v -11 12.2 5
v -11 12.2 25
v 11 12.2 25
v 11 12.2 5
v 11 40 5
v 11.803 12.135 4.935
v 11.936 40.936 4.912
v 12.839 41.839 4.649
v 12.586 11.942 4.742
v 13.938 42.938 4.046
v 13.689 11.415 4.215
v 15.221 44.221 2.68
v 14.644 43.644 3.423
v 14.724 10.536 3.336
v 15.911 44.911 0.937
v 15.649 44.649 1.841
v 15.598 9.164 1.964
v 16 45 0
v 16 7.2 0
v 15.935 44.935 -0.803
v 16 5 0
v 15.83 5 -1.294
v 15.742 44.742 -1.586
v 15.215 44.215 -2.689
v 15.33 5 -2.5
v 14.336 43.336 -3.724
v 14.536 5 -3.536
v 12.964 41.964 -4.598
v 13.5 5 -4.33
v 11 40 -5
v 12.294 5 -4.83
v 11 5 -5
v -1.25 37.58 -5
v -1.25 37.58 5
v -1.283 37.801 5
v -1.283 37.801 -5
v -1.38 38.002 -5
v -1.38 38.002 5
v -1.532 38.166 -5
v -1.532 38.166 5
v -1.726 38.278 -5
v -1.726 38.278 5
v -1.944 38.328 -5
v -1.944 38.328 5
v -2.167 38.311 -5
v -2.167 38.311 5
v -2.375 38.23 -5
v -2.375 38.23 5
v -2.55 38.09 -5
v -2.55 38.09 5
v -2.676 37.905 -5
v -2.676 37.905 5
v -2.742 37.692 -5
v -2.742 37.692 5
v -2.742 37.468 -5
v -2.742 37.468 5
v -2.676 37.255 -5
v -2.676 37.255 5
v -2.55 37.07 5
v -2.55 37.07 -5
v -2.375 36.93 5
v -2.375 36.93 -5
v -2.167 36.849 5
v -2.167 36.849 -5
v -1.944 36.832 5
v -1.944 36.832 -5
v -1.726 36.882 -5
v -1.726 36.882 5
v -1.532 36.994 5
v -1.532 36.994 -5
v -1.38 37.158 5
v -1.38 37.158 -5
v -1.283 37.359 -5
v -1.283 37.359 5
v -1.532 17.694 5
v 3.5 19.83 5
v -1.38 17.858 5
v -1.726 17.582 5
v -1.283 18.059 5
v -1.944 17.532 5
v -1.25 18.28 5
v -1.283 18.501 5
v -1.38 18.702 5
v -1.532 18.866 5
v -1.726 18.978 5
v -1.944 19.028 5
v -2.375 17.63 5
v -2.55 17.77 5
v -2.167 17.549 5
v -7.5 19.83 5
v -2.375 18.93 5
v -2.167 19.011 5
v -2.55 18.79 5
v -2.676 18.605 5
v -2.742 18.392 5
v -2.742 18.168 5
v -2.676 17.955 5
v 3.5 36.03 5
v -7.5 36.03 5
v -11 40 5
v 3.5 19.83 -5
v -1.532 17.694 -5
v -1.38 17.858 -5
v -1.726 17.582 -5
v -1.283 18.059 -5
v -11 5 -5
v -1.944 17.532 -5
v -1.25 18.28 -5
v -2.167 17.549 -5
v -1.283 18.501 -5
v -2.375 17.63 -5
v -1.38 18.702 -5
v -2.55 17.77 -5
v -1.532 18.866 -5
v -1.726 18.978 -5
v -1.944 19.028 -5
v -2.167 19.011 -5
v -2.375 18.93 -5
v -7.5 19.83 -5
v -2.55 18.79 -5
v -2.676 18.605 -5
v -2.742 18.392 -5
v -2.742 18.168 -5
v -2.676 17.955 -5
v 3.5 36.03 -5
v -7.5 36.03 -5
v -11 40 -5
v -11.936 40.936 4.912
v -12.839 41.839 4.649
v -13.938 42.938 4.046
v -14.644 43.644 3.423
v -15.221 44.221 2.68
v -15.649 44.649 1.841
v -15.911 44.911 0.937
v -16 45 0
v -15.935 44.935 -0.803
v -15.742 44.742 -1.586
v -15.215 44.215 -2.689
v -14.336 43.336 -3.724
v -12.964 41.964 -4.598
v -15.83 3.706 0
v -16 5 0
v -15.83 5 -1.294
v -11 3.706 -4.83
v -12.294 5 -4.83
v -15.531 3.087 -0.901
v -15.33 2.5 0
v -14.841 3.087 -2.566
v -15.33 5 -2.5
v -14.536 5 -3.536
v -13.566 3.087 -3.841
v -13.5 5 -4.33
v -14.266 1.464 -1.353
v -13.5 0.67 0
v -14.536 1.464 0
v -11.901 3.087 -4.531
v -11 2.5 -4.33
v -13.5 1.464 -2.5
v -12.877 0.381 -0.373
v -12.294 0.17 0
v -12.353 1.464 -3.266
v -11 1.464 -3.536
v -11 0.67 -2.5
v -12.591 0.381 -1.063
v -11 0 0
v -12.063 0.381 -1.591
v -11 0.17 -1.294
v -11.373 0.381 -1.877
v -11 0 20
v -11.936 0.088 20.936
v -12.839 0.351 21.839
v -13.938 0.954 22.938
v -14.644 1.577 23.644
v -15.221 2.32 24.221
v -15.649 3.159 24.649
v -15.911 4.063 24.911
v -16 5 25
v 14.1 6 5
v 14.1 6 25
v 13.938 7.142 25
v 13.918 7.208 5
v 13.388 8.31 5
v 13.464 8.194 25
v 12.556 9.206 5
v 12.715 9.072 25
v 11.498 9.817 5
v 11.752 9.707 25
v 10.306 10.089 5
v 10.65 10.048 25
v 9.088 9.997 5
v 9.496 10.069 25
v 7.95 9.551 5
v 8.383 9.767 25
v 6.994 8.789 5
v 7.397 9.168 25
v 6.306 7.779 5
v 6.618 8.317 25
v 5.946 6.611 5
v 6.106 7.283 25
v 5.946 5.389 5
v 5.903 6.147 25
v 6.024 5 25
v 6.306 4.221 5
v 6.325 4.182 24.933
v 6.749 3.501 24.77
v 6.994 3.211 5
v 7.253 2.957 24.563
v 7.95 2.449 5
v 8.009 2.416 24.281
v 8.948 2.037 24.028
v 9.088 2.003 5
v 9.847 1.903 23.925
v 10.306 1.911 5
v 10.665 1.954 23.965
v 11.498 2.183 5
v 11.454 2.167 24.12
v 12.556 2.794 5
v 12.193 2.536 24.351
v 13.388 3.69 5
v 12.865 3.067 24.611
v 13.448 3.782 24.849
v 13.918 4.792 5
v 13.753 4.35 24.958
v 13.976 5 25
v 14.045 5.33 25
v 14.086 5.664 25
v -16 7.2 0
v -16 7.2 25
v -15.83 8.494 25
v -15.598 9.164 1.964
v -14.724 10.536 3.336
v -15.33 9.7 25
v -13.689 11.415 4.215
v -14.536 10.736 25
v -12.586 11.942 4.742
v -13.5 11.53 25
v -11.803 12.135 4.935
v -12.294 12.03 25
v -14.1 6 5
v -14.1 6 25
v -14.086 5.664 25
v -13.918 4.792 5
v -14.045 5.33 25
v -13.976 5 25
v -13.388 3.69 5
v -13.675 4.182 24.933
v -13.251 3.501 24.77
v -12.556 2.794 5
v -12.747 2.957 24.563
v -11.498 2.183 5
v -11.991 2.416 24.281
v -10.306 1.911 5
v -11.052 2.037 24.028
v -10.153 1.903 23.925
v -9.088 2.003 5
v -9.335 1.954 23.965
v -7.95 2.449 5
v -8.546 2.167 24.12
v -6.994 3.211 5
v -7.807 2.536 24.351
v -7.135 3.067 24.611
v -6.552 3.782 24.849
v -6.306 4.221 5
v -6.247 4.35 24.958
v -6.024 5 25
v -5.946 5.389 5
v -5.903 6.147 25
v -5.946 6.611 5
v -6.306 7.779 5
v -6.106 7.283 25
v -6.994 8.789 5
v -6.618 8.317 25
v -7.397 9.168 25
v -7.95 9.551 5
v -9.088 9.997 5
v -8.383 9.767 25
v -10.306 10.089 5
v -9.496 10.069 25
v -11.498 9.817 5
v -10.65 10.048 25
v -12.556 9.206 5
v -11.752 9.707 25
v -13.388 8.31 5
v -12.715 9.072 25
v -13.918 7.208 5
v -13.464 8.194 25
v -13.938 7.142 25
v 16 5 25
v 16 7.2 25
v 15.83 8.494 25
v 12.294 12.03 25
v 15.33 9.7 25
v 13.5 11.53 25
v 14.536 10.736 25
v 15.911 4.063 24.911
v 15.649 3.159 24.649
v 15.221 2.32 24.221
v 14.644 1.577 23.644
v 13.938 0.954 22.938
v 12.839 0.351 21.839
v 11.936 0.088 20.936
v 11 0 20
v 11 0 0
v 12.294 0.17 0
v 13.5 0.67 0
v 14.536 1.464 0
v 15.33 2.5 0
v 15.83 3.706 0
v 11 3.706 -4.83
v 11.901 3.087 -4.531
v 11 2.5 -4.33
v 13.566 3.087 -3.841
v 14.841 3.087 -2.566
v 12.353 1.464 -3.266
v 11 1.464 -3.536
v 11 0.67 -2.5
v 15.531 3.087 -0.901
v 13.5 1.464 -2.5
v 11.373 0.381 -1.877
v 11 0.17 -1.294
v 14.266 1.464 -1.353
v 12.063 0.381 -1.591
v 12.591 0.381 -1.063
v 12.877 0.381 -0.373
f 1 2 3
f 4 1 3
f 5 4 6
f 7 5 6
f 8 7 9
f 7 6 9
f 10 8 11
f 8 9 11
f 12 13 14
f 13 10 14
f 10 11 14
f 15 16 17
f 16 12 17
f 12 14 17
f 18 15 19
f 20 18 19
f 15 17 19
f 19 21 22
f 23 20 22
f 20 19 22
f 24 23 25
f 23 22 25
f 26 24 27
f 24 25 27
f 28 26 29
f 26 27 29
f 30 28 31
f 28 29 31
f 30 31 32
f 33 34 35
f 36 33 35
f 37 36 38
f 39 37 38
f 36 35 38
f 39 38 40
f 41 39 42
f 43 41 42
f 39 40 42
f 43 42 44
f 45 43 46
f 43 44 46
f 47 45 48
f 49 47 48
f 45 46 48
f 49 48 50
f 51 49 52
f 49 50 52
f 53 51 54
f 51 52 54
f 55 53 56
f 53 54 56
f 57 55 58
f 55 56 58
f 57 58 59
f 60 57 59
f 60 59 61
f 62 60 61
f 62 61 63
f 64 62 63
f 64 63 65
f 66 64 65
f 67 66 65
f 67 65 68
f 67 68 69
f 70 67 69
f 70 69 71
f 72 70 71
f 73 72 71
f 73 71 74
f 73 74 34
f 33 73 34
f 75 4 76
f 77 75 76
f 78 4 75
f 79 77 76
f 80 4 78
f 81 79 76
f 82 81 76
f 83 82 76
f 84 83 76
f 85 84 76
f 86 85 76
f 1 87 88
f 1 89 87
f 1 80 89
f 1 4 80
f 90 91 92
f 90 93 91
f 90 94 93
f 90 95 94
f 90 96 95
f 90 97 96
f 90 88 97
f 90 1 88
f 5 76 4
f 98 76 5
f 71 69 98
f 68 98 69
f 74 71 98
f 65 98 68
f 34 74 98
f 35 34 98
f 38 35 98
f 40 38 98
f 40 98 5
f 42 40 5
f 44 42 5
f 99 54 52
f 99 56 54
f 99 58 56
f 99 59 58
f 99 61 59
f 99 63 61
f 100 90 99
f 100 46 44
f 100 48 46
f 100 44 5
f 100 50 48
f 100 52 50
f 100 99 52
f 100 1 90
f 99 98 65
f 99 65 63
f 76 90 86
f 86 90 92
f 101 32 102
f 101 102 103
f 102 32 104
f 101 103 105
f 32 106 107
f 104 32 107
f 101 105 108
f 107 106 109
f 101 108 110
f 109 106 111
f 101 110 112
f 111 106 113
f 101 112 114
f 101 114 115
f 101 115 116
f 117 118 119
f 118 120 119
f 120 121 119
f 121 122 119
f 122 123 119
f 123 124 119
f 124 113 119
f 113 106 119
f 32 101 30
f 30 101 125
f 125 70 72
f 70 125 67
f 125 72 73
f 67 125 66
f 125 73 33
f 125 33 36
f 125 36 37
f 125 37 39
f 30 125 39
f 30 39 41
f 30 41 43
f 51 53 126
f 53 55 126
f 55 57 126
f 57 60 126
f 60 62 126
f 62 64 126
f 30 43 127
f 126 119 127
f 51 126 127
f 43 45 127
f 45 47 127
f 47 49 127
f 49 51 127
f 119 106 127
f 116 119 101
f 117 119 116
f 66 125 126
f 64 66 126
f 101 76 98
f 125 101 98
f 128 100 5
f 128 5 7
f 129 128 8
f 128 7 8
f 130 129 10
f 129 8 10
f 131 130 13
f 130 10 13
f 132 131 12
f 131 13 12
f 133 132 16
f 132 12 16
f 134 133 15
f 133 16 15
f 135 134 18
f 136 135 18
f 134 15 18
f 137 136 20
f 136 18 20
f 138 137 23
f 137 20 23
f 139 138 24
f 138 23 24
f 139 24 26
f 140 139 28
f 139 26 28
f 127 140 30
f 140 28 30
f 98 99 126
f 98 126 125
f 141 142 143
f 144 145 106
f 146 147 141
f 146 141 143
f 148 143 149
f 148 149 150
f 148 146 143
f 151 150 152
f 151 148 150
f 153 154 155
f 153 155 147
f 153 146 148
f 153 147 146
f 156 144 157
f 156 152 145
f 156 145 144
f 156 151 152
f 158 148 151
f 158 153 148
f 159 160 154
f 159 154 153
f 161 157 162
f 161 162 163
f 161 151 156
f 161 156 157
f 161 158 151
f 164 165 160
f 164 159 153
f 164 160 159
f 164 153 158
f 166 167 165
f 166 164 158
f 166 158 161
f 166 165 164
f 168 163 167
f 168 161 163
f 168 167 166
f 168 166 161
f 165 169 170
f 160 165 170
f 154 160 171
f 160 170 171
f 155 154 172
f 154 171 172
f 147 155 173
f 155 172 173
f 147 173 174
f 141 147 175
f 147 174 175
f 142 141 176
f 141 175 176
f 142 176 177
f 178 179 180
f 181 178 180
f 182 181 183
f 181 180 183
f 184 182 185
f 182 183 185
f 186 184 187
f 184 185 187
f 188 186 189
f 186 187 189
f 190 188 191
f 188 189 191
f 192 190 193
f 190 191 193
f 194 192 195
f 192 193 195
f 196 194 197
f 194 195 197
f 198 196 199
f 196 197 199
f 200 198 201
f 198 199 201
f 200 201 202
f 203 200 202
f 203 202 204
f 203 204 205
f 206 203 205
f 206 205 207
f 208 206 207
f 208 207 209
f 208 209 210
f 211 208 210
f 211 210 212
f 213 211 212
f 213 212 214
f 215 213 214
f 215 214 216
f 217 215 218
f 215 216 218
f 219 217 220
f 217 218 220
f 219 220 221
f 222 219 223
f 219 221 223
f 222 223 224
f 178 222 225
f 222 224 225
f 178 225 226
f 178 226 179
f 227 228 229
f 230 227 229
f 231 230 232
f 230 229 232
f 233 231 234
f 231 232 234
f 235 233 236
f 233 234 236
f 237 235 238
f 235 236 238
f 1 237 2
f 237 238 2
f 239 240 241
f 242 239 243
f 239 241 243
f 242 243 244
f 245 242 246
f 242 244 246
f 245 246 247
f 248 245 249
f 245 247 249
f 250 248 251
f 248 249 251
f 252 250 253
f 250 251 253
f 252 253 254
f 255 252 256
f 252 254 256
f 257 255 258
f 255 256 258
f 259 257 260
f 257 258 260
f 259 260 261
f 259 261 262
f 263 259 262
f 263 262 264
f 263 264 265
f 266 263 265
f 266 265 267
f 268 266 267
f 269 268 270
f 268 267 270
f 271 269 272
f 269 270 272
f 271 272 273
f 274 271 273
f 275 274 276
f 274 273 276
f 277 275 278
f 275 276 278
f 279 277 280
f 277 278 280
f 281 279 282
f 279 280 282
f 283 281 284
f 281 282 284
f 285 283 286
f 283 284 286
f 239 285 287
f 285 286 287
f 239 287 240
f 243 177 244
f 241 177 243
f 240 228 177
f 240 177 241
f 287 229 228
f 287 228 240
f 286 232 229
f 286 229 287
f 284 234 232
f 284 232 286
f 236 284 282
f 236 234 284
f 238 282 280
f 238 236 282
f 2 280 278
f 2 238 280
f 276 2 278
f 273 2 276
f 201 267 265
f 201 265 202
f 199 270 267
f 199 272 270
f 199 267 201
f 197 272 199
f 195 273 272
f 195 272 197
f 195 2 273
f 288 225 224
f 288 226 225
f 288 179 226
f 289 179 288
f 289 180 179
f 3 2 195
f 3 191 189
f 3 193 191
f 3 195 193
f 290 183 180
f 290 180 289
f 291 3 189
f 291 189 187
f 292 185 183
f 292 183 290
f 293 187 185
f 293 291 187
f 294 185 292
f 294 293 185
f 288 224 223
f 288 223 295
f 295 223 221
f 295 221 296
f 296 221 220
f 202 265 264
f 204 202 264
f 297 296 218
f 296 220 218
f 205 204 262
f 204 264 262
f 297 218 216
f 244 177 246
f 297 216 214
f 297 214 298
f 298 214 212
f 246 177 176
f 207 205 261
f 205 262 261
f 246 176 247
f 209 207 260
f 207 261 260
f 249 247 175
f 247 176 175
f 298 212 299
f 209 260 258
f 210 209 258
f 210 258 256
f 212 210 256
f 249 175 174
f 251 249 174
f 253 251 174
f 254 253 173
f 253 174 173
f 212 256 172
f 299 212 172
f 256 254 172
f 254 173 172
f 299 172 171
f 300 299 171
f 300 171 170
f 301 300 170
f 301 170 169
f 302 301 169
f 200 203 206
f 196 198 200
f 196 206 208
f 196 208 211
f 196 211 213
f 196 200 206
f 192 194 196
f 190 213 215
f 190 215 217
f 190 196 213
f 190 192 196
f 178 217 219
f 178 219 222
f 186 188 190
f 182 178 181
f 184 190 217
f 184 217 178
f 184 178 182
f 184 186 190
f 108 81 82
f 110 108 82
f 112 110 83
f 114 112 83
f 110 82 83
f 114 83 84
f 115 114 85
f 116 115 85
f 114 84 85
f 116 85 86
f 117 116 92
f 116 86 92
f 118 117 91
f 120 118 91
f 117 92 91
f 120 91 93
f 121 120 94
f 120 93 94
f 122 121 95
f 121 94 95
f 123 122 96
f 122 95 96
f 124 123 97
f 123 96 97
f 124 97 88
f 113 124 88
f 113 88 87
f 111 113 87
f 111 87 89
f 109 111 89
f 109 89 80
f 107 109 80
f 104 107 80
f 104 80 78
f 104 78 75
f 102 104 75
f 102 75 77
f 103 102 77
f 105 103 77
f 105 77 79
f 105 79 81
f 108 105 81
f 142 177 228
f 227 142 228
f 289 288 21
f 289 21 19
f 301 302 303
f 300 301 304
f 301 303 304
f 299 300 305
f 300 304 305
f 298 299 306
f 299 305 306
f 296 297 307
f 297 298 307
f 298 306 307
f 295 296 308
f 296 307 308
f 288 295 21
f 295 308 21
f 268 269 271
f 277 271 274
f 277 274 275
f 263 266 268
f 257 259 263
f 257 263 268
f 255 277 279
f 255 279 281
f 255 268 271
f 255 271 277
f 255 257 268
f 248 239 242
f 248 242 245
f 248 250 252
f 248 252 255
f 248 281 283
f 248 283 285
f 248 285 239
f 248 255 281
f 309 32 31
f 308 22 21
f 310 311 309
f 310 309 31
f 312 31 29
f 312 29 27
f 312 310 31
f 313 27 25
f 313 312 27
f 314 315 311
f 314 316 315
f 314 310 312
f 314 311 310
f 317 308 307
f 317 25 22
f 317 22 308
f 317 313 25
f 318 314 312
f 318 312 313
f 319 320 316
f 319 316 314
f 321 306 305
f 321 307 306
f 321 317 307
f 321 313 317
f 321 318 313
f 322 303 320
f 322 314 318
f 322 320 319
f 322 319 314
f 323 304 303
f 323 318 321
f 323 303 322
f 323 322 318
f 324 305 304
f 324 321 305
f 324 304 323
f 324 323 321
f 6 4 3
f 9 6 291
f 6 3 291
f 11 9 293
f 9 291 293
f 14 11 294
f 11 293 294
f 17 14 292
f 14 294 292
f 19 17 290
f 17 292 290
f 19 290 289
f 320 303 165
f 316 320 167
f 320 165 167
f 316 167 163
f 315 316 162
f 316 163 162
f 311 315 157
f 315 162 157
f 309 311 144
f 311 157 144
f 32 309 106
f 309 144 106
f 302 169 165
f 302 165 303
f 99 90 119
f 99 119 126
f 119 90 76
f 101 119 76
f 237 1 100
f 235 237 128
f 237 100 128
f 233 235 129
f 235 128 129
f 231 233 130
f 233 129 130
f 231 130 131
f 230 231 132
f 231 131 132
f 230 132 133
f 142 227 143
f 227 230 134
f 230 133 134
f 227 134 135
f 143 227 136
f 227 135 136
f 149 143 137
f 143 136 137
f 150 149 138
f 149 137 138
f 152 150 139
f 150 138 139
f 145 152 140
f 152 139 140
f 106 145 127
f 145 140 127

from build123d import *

# Parameters (mm, degrees)
SKETCH1_W           = 32
SKETCH1_H           = 45
BOSS_EXTRUDE1_DEPTH = 25
SKETCH2_R           = 4.1
CUT_EXTRUDE1_DEPTH  = 20
SKETCH3_W           = 32
SKETCH3_H           = 32.8
CUT_EXTRUDE2_DEPTH  = 20
SKETCH4_R           = 0.75
SKETCH4_W           = 11
SKETCH4_H           = 16.2
CUT_EXTRUDE3_DEPTH  = 57.400354609
SKETCH5_W           = 20
SKETCH5_H           = 45
CUT_EXTRUDE5_DEPTH  = 61.613529843
FILLET1_R           = 5


with BuildPart() as part:
    # Sketch1 → Boss-Extrude1 (new, symmetric)
    with BuildSketch(Plane.XY):
        with Locations((0, 22.5)):
            Rectangle(SKETCH1_W, SKETCH1_H)
    extrude(amount=BOSS_EXTRUDE1_DEPTH, both=True)

    # Sketch2 → Cut-Extrude1 (cut)
    with BuildSketch(Plane.XY.offset(25)):
        with Locations((10, 6)):
            Circle(SKETCH2_R)
        with Locations(Location((-10, 6, 0), (0, 0, 180))):
            Circle(SKETCH2_R)
    extrude(amount=-CUT_EXTRUDE1_DEPTH, mode=Mode.SUBTRACT)

    # Sketch3 → Cut-Extrude2 (cut)
    with BuildSketch(Plane.XY.offset(25)):
        with Locations((0, 28.6)):
            Rectangle(SKETCH3_W, SKETCH3_H)
    extrude(amount=-CUT_EXTRUDE2_DEPTH, mode=Mode.SUBTRACT)

    # Sketch4 → Cut-Extrude3 (cut, through all)
    with BuildSketch(Plane.XY.offset(5)):
        with Locations((-2, 37.58)):
            Circle(SKETCH4_R)
        with Locations((-2, 18.28)):
            Circle(SKETCH4_R)
        with Locations((-2, 27.93)):
            Rectangle(SKETCH4_W, SKETCH4_H)
    extrude(amount=-CUT_EXTRUDE3_DEPTH, mode=Mode.SUBTRACT)

    # Sketch5 → Cut-Extrude5 (cut, through all)
    with BuildSketch(Plane.ZY.offset(16)):
        with Locations((-15, 22.5)):
            Rectangle(SKETCH5_W, SKETCH5_H)
    extrude(amount=-CUT_EXTRUDE5_DEPTH, mode=Mode.SUBTRACT)

    # Fillet1
    # the kernel refuses this fillet: 5 mm, written as the material it takes off along each edge
    with BuildSketch(Plane(origin=(-11, 5, 0), x_dir=(-1, 0, 0), z_dir=(0, -1, 0))) as fillet1_piece_1_section:
        Polygon((0, 0), (FILLET1_R * 1.02, 0), (FILLET1_R * 1.02, FILLET1_R * 1.02), (0, FILLET1_R * 1.02), align=None)
    fillet1_piece_1 = extrude(amount=FILLET1_R * 1.02, mode=Mode.PRIVATE)
    fillet1_piece_1 = fillet1_piece_1 - Plane(origin=(-11, 5, 0), x_dir=(0.7071067811865475, 0, 0.7071067811865475), z_dir=(0, -1, 0)) * Sphere(FILLET1_R, mode=Mode.PRIVATE)
    add(fillet1_piece_1, mode=Mode.SUBTRACT)
    with BuildSketch(Plane(origin=(11, 5, 0), x_dir=(1, 0, 0), z_dir=(0, -1, 0))) as fillet1_piece_2_section:
        Polygon((0, 0), (FILLET1_R * 1.02, 0), (FILLET1_R * 1.02, -FILLET1_R * 1.02), (0, -FILLET1_R * 1.02), align=None)
    fillet1_piece_2 = extrude(amount=FILLET1_R * 1.02, mode=Mode.PRIVATE)
    fillet1_piece_2 = fillet1_piece_2 - Plane(origin=(11, 5, 0), x_dir=(-0.7071067811865475, 0, 0.7071067811865475), z_dir=(0, -1, 0)) * Sphere(FILLET1_R, mode=Mode.PRIVATE)
    add(fillet1_piece_2, mode=Mode.SUBTRACT)
    with BuildSketch(Plane(origin=(16, 12.2, 25), x_dir=(0, -1, 0), z_dir=(0, 0, -1))) as fillet1_piece_3:
        with BuildLine():
            CenterArc((FILLET1_R, FILLET1_R), FILLET1_R, 180, 90)
            Line((0, FILLET1_R), (-FILLET1_R * 0.02, FILLET1_R))
            Line((-FILLET1_R * 0.02, FILLET1_R), (-FILLET1_R * 0.02, -FILLET1_R * 0.02))
            Line((-FILLET1_R * 0.02, -FILLET1_R * 0.02), (FILLET1_R, -FILLET1_R * 0.02))
            Line((FILLET1_R, -FILLET1_R * 0.02), (FILLET1_R, 0))
        make_face()
    extrude(amount=20, mode=Mode.SUBTRACT)
    with BuildSketch(Plane(origin=(-11, 0, -5), x_dir=(0, 0, 1), z_dir=(1, 0, 0))) as fillet1_piece_4:
        with BuildLine():
            CenterArc((FILLET1_R, -FILLET1_R), FILLET1_R, 90, 90)
            Line((0, -FILLET1_R), (-FILLET1_R * 0.02, -FILLET1_R))
            Line((-FILLET1_R * 0.02, -FILLET1_R), (-FILLET1_R * 0.02, FILLET1_R * 0.02))
            Line((-FILLET1_R * 0.02, FILLET1_R * 0.02), (FILLET1_R, FILLET1_R * 0.02))
            Line((FILLET1_R, FILLET1_R * 0.02), (FILLET1_R, 0))
        make_face()
    extrude(amount=22, mode=Mode.SUBTRACT)
    with BuildSketch(Plane(origin=(-16, 45, -5), x_dir=(0, -1, 0), z_dir=(1, 0, 0)), Plane(origin=(16, 45, 5), x_dir=(0, -1, 0), z_dir=(-1, 0, 0))) as fillet1_piece_5:
        with BuildLine():
            CenterArc((FILLET1_R, -FILLET1_R), FILLET1_R, 90, 90)
            Line((0, -FILLET1_R), (-FILLET1_R * 0.02, -FILLET1_R))
            Line((-FILLET1_R * 0.02, -FILLET1_R), (-FILLET1_R * 0.02, FILLET1_R * 0.02))
            Line((-FILLET1_R * 0.02, FILLET1_R * 0.02), (FILLET1_R, FILLET1_R * 0.02))
            Line((FILLET1_R, FILLET1_R * 0.02), (FILLET1_R, 0))
        make_face()
    extrude(amount=32, mode=Mode.SUBTRACT)
    with BuildSketch(Plane(origin=(-16, 45, -5), x_dir=(0, 0, 1), z_dir=(0, -1, 0)), Plane(origin=(16, 5, -5), x_dir=(0, 0, 1), z_dir=(0, 1, 0))) as fillet1_piece_6:
        with BuildLine():
            CenterArc((FILLET1_R, -FILLET1_R), FILLET1_R, 90, 90)
            Line((0, -FILLET1_R), (-FILLET1_R * 0.02, -FILLET1_R))
            Line((-FILLET1_R * 0.02, -FILLET1_R), (-FILLET1_R * 0.02, FILLET1_R * 0.02))
            Line((-FILLET1_R * 0.02, FILLET1_R * 0.02), (FILLET1_R, FILLET1_R * 0.02))
            Line((FILLET1_R, FILLET1_R * 0.02), (FILLET1_R, 0))
        make_face()
    extrude(amount=40, mode=Mode.SUBTRACT)
    with BuildSketch(Plane(origin=(16, 0, 0), x_dir=(-1, 0, 0), z_dir=(0, 0, 1)), Plane(origin=(-16, 0, 25), x_dir=(1, 0, 0), z_dir=(0, 0, -1))) as fillet1_piece_7:
        with BuildLine():
            CenterArc((FILLET1_R, -FILLET1_R), FILLET1_R, 90, 90)
            Line((0, -FILLET1_R), (-FILLET1_R * 0.02, -FILLET1_R))
            Line((-FILLET1_R * 0.02, -FILLET1_R), (-FILLET1_R * 0.02, FILLET1_R * 0.02))
            Line((-FILLET1_R * 0.02, FILLET1_R * 0.02), (FILLET1_R, FILLET1_R * 0.02))
            Line((FILLET1_R, FILLET1_R * 0.02), (FILLET1_R, 0))
        make_face()
    extrude(amount=25, mode=Mode.SUBTRACT)
    with BuildSketch(Plane(origin=(-16, 0, 25), x_dir=(0, 0, -1), z_dir=(1, 0, 0))) as fillet1_piece_8:
        with BuildLine():
            CenterArc((FILLET1_R, FILLET1_R), FILLET1_R, 180, 90)
            Line((0, FILLET1_R), (-FILLET1_R * 0.02, FILLET1_R))
            Line((-FILLET1_R * 0.02, FILLET1_R), (-FILLET1_R * 0.02, -FILLET1_R * 0.02))
            Line((-FILLET1_R * 0.02, -FILLET1_R * 0.02), (FILLET1_R, -FILLET1_R * 0.02))
            Line((FILLET1_R, -FILLET1_R * 0.02), (FILLET1_R, 0))
        make_face()
    extrude(amount=32, mode=Mode.SUBTRACT)
    with BuildSketch(Plane(origin=(-16, 12.2, 25), x_dir=(0, -1, 0), z_dir=(0, 0, -1))) as fillet1_piece_9:
        with BuildLine():
            CenterArc((FILLET1_R, -FILLET1_R), FILLET1_R, 90, 90)
            Line((0, -FILLET1_R), (-FILLET1_R * 0.02, -FILLET1_R))
            Line((-FILLET1_R * 0.02, -FILLET1_R), (-FILLET1_R * 0.02, FILLET1_R * 0.02))
            Line((-FILLET1_R * 0.02, FILLET1_R * 0.02), (FILLET1_R, FILLET1_R * 0.02))
            Line((FILLET1_R, FILLET1_R * 0.02), (FILLET1_R, 0))
        make_face()
    extrude(amount=20, mode=Mode.SUBTRACT)
    with BuildSketch(Plane(origin=(16, 12.2, 5), x_dir=(0, 0, -1), z_dir=(0, 1, 0)), Plane(origin=(-16, 45, 5), x_dir=(0, 0, -1), z_dir=(0, -1, 0))) as fillet1_piece_10:
        with BuildLine():
            CenterArc((FILLET1_R, FILLET1_R), FILLET1_R, 180, 90)
            Line((0, FILLET1_R), (-FILLET1_R * 0.02, FILLET1_R))
            Line((-FILLET1_R * 0.02, FILLET1_R), (-FILLET1_R * 0.02, -FILLET1_R * 0.02))
            Line((-FILLET1_R * 0.02, -FILLET1_R * 0.02), (FILLET1_R, -FILLET1_R * 0.02))
            Line((FILLET1_R, -FILLET1_R * 0.02), (FILLET1_R, 0))
        make_face()
    extrude(amount=32.8, mode=Mode.SUBTRACT)
    with BuildSketch(Plane(origin=(16, 12.2, 25), x_dir=(0, -1, 0), z_dir=(0, 0, -1))) as fillet1_piece_11a_section:
        with BuildLine():
            CenterArc((FILLET1_R, FILLET1_R), FILLET1_R, 180, 90)
            Line((0, FILLET1_R), (-FILLET1_R * 0.02, FILLET1_R))
            Line((-FILLET1_R * 0.02, FILLET1_R), (-FILLET1_R * 0.02, -FILLET1_R * 0.02))
            Line((-FILLET1_R * 0.02, -FILLET1_R * 0.02), (FILLET1_R, -FILLET1_R * 0.02))
            Line((FILLET1_R, -FILLET1_R * 0.02), (FILLET1_R, 0))
        make_face()
    fillet1_piece_11a = extrude(amount=32.5, mode=Mode.PRIVATE)
    fillet1_piece_11a = split(fillet1_piece_11a, bisect_by=Plane(origin=(14.868024429, 11.068024429, 5), z_dir=(0, 0, -1)), keep=Keep.TOP, mode=Mode.PRIVATE)
    with BuildSketch(Plane(origin=(16, -0.3, 5), x_dir=(0, 0, -1), z_dir=(0, 1, 0))) as fillet1_piece_11b_section:
        with BuildLine():
            CenterArc((FILLET1_R, FILLET1_R), FILLET1_R, 180, 90)
            Line((0, FILLET1_R), (-FILLET1_R * 0.02, FILLET1_R))
            Line((-FILLET1_R * 0.02, FILLET1_R), (-FILLET1_R * 0.02, -FILLET1_R * 0.02))
            Line((-FILLET1_R * 0.02, -FILLET1_R * 0.02), (FILLET1_R, -FILLET1_R * 0.02))
            Line((FILLET1_R, -FILLET1_R * 0.02), (FILLET1_R, 0))
        make_face()
    fillet1_piece_11b = extrude(amount=45.3, mode=Mode.PRIVATE)
    fillet1_piece_11b = split(fillet1_piece_11b, bisect_by=Plane(origin=(14.868024429, 12.2, 3.868024429), z_dir=(0, -1, 0)), keep=Keep.TOP, mode=Mode.PRIVATE)
    fillet1_piece_11 = fillet1_piece_11a & fillet1_piece_11b
    add(fillet1_piece_11, mode=Mode.SUBTRACT)
    with BuildSketch(Plane(origin=(-16, 57.5, -5), x_dir=(0, 0, 1), z_dir=(0, -1, 0))) as fillet1_piece_12a_section:
        with BuildLine():
            CenterArc((FILLET1_R, -FILLET1_R), FILLET1_R, 90, 90)
            Line((0, -FILLET1_R), (-FILLET1_R * 0.02, -FILLET1_R))
            Line((-FILLET1_R * 0.02, -FILLET1_R), (-FILLET1_R * 0.02, FILLET1_R * 0.02))
            Line((-FILLET1_R * 0.02, FILLET1_R * 0.02), (FILLET1_R, FILLET1_R * 0.02))
            Line((FILLET1_R, FILLET1_R * 0.02), (FILLET1_R, 0))
        make_face()
    fillet1_piece_12a = extrude(amount=52.5, mode=Mode.PRIVATE)
    fillet1_piece_12a = split(fillet1_piece_12a, bisect_by=Plane(origin=(-14.868024429, 45, -3.868024429), z_dir=(0, 1, 0)), keep=Keep.TOP, mode=Mode.PRIVATE)
    with BuildSketch(Plane(origin=(-28.5, 45, -5), x_dir=(0, -1, 0), z_dir=(1, 0, 0))) as fillet1_piece_12b_section:
        with BuildLine():
            CenterArc((FILLET1_R, -FILLET1_R), FILLET1_R, 90, 90)
            Line((0, -FILLET1_R), (-FILLET1_R * 0.02, -FILLET1_R))
            Line((-FILLET1_R * 0.02, -FILLET1_R), (-FILLET1_R * 0.02, FILLET1_R * 0.02))
            Line((-FILLET1_R * 0.02, FILLET1_R * 0.02), (FILLET1_R, FILLET1_R * 0.02))
            Line((FILLET1_R, FILLET1_R * 0.02), (FILLET1_R, 0))
        make_face()
    fillet1_piece_12b = extrude(amount=44.5, mode=Mode.PRIVATE)
    fillet1_piece_12b = split(fillet1_piece_12b, bisect_by=Plane(origin=(-16, 43.868024429, -3.868024429), z_dir=(-1, 0, 0)), keep=Keep.TOP, mode=Mode.PRIVATE)
    fillet1_piece_12 = fillet1_piece_12a & fillet1_piece_12b
    add(fillet1_piece_12, mode=Mode.SUBTRACT)
    with BuildSketch(Plane(origin=(16, 5, -5), x_dir=(0, 0, 1), z_dir=(0, 1, 0))) as fillet1_piece_13a_section:
        with BuildLine():
            CenterArc((FILLET1_R, -FILLET1_R), FILLET1_R, 90, 90)
            Line((0, -FILLET1_R), (-FILLET1_R * 0.02, -FILLET1_R))
            Line((-FILLET1_R * 0.02, -FILLET1_R), (-FILLET1_R * 0.02, FILLET1_R * 0.02))
            Line((-FILLET1_R * 0.02, FILLET1_R * 0.02), (FILLET1_R, FILLET1_R * 0.02))
            Line((FILLET1_R, FILLET1_R * 0.02), (FILLET1_R, 0))
        make_face()
    fillet1_piece_13a = extrude(amount=52.5, mode=Mode.PRIVATE)
    fillet1_piece_13a = split(fillet1_piece_13a, bisect_by=Plane(origin=(14.868024429, 45, -3.868024429), z_dir=(0, 1, 0)), keep=Keep.TOP, mode=Mode.PRIVATE)
    with BuildSketch(Plane(origin=(-16, 45, -5), x_dir=(0, -1, 0), z_dir=(1, 0, 0))) as fillet1_piece_13b_section:
        with BuildLine():
            CenterArc((FILLET1_R, -FILLET1_R), FILLET1_R, 90, 90)
            Line((0, -FILLET1_R), (-FILLET1_R * 0.02, -FILLET1_R))
            Line((-FILLET1_R * 0.02, -FILLET1_R), (-FILLET1_R * 0.02, FILLET1_R * 0.02))
            Line((-FILLET1_R * 0.02, FILLET1_R * 0.02), (FILLET1_R, FILLET1_R * 0.02))
            Line((FILLET1_R, FILLET1_R * 0.02), (FILLET1_R, 0))
        make_face()
    fillet1_piece_13b = extrude(amount=44.5, mode=Mode.PRIVATE)
    fillet1_piece_13b = split(fillet1_piece_13b, bisect_by=Plane(origin=(16, 43.868024429, -3.868024429), z_dir=(1, 0, 0)), keep=Keep.TOP, mode=Mode.PRIVATE)
    fillet1_piece_13 = fillet1_piece_13a & fillet1_piece_13b
    add(fillet1_piece_13, mode=Mode.SUBTRACT)
    with BuildSketch(Plane(origin=(-16, 0, 25), x_dir=(0, 0, -1), z_dir=(1, 0, 0))) as fillet1_piece_14a_section:
        with BuildLine():
            CenterArc((FILLET1_R, FILLET1_R), FILLET1_R, 180, 90)
            Line((0, FILLET1_R), (-FILLET1_R * 0.02, FILLET1_R))
            Line((-FILLET1_R * 0.02, FILLET1_R), (-FILLET1_R * 0.02, -FILLET1_R * 0.02))
            Line((-FILLET1_R * 0.02, -FILLET1_R * 0.02), (FILLET1_R, -FILLET1_R * 0.02))
            Line((FILLET1_R, -FILLET1_R * 0.02), (FILLET1_R, 0))
        make_face()
    fillet1_piece_14a = extrude(amount=44.5, mode=Mode.PRIVATE)
    fillet1_piece_14a = split(fillet1_piece_14a, bisect_by=Plane(origin=(16, 1.131975571, 23.868024429), z_dir=(1, 0, 0)), keep=Keep.TOP, mode=Mode.PRIVATE)
    with BuildSketch(Plane(origin=(16, 0, 0), x_dir=(-1, 0, 0), z_dir=(0, 0, 1))) as fillet1_piece_14b_section:
        with BuildLine():
            CenterArc((FILLET1_R, -FILLET1_R), FILLET1_R, 90, 90)
            Line((0, -FILLET1_R), (-FILLET1_R * 0.02, -FILLET1_R))
            Line((-FILLET1_R * 0.02, -FILLET1_R), (-FILLET1_R * 0.02, FILLET1_R * 0.02))
            Line((-FILLET1_R * 0.02, FILLET1_R * 0.02), (FILLET1_R, FILLET1_R * 0.02))
            Line((FILLET1_R, FILLET1_R * 0.02), (FILLET1_R, 0))
        make_face()
    fillet1_piece_14b = extrude(amount=37.5, mode=Mode.PRIVATE)
    fillet1_piece_14b = split(fillet1_piece_14b, bisect_by=Plane(origin=(14.868024429, 1.131975571, 25), z_dir=(0, 0, 1)), keep=Keep.TOP, mode=Mode.PRIVATE)
    fillet1_piece_14 = fillet1_piece_14a & fillet1_piece_14b
    add(fillet1_piece_14, mode=Mode.SUBTRACT)
    with BuildSketch(Plane(origin=(-16, 0, 37.5), x_dir=(1, 0, 0), z_dir=(0, 0, -1))) as fillet1_piece_15a_section:
        with BuildLine():
            CenterArc((FILLET1_R, -FILLET1_R), FILLET1_R, 90, 90)
            Line((0, -FILLET1_R), (-FILLET1_R * 0.02, -FILLET1_R))
            Line((-FILLET1_R * 0.02, -FILLET1_R), (-FILLET1_R * 0.02, FILLET1_R * 0.02))
            Line((-FILLET1_R * 0.02, FILLET1_R * 0.02), (FILLET1_R, FILLET1_R * 0.02))
            Line((FILLET1_R, FILLET1_R * 0.02), (FILLET1_R, 0))
        make_face()
    fillet1_piece_15a = extrude(amount=37.5, mode=Mode.PRIVATE)
    fillet1_piece_15a = split(fillet1_piece_15a, bisect_by=Plane(origin=(-14.868024429, 1.131975571, 25), z_dir=(0, 0, 1)), keep=Keep.TOP, mode=Mode.PRIVATE)
    with BuildSketch(Plane(origin=(-28.5, 0, 25), x_dir=(0, 0, -1), z_dir=(1, 0, 0))) as fillet1_piece_15b_section:
        with BuildLine():
            CenterArc((FILLET1_R, FILLET1_R), FILLET1_R, 180, 90)
            Line((0, FILLET1_R), (-FILLET1_R * 0.02, FILLET1_R))
            Line((-FILLET1_R * 0.02, FILLET1_R), (-FILLET1_R * 0.02, -FILLET1_R * 0.02))
            Line((-FILLET1_R * 0.02, -FILLET1_R * 0.02), (FILLET1_R, -FILLET1_R * 0.02))
            Line((FILLET1_R, -FILLET1_R * 0.02), (FILLET1_R, 0))
        make_face()
    fillet1_piece_15b = extrude(amount=44.5, mode=Mode.PRIVATE)
    fillet1_piece_15b = split(fillet1_piece_15b, bisect_by=Plane(origin=(-16, 1.131975571, 23.868024429), z_dir=(-1, 0, 0)), keep=Keep.TOP, mode=Mode.PRIVATE)
    fillet1_piece_15 = fillet1_piece_15a & fillet1_piece_15b
    add(fillet1_piece_15, mode=Mode.SUBTRACT)
    with BuildSketch(Plane(origin=(-16, 45, 5), x_dir=(0, 0, -1), z_dir=(0, -1, 0))) as fillet1_piece_16a_section:
        with BuildLine():
            CenterArc((FILLET1_R, FILLET1_R), FILLET1_R, 180, 90)
            Line((0, FILLET1_R), (-FILLET1_R * 0.02, FILLET1_R))
            Line((-FILLET1_R * 0.02, FILLET1_R), (-FILLET1_R * 0.02, -FILLET1_R * 0.02))
            Line((-FILLET1_R * 0.02, -FILLET1_R * 0.02), (FILLET1_R, -FILLET1_R * 0.02))
            Line((FILLET1_R, -FILLET1_R * 0.02), (FILLET1_R, 0))
        make_face()
    fillet1_piece_16a = extrude(amount=45.3, mode=Mode.PRIVATE)
    fillet1_piece_16a = split(fillet1_piece_16a, bisect_by=Plane(origin=(-14.868024429, 12.2, 3.868024429), z_dir=(0, -1, 0)), keep=Keep.TOP, mode=Mode.PRIVATE)
    with BuildSketch(Plane(origin=(-16, 12.2, 25), x_dir=(0, -1, 0), z_dir=(0, 0, -1))) as fillet1_piece_16b_section:
        with BuildLine():
            CenterArc((FILLET1_R, -FILLET1_R), FILLET1_R, 90, 90)
            Line((0, -FILLET1_R), (-FILLET1_R * 0.02, -FILLET1_R))
            Line((-FILLET1_R * 0.02, -FILLET1_R), (-FILLET1_R * 0.02, FILLET1_R * 0.02))
            Line((-FILLET1_R * 0.02, FILLET1_R * 0.02), (FILLET1_R, FILLET1_R * 0.02))
            Line((FILLET1_R, FILLET1_R * 0.02), (FILLET1_R, 0))
        make_face()
    fillet1_piece_16b = extrude(amount=32.5, mode=Mode.PRIVATE)
    fillet1_piece_16b = split(fillet1_piece_16b, bisect_by=Plane(origin=(-14.868024429, 11.068024429, 5), z_dir=(0, 0, -1)), keep=Keep.TOP, mode=Mode.PRIVATE)
    fillet1_piece_16 = fillet1_piece_16a & fillet1_piece_16b
    add(fillet1_piece_16, mode=Mode.SUBTRACT)
    with BuildSketch(Plane(origin=(16, 12.2, 5), x_dir=(0, 0, -1), z_dir=(0, 1, 0))) as fillet1_piece_17a_section:
        with BuildLine():
            CenterArc((FILLET1_R, FILLET1_R), FILLET1_R, 180, 90)
            Line((0, FILLET1_R), (-FILLET1_R * 0.02, FILLET1_R))
            Line((-FILLET1_R * 0.02, FILLET1_R), (-FILLET1_R * 0.02, -FILLET1_R * 0.02))
            Line((-FILLET1_R * 0.02, -FILLET1_R * 0.02), (FILLET1_R, -FILLET1_R * 0.02))
            Line((FILLET1_R, -FILLET1_R * 0.02), (FILLET1_R, 0))
        make_face()
    fillet1_piece_17a = extrude(amount=45.3, mode=Mode.PRIVATE)
    fillet1_piece_17a = split(fillet1_piece_17a, bisect_by=Plane(origin=(14.868024429, 45, 3.868024429), z_dir=(0, 1, 0)), keep=Keep.TOP, mode=Mode.PRIVATE)
    with BuildSketch(Plane(origin=(28.5, 45, 5), x_dir=(0, -1, 0), z_dir=(-1, 0, 0))) as fillet1_piece_17b_section:
        with BuildLine():
            CenterArc((FILLET1_R, -FILLET1_R), FILLET1_R, 90, 90)
            Line((0, -FILLET1_R), (-FILLET1_R * 0.02, -FILLET1_R))
            Line((-FILLET1_R * 0.02, -FILLET1_R), (-FILLET1_R * 0.02, FILLET1_R * 0.02))
            Line((-FILLET1_R * 0.02, FILLET1_R * 0.02), (FILLET1_R, FILLET1_R * 0.02))
            Line((FILLET1_R, FILLET1_R * 0.02), (FILLET1_R, 0))
        make_face()
    fillet1_piece_17b = extrude(amount=44.5, mode=Mode.PRIVATE)
    fillet1_piece_17b = split(fillet1_piece_17b, bisect_by=Plane(origin=(16, 43.868024429, 3.868024429), z_dir=(1, 0, 0)), keep=Keep.TOP, mode=Mode.PRIVATE)
    fillet1_piece_17 = fillet1_piece_17a & fillet1_piece_17b
    add(fillet1_piece_17, mode=Mode.SUBTRACT)
    with BuildSketch(Plane(origin=(-16, 57.5, 5), x_dir=(0, 0, -1), z_dir=(0, -1, 0))) as fillet1_piece_18a_section:
        with BuildLine():
            CenterArc((FILLET1_R, FILLET1_R), FILLET1_R, 180, 90)
            Line((0, FILLET1_R), (-FILLET1_R * 0.02, FILLET1_R))
            Line((-FILLET1_R * 0.02, FILLET1_R), (-FILLET1_R * 0.02, -FILLET1_R * 0.02))
            Line((-FILLET1_R * 0.02, -FILLET1_R * 0.02), (FILLET1_R, -FILLET1_R * 0.02))
            Line((FILLET1_R, -FILLET1_R * 0.02), (FILLET1_R, 0))
        make_face()
    fillet1_piece_18a = extrude(amount=45.3, mode=Mode.PRIVATE)
    fillet1_piece_18a = split(fillet1_piece_18a, bisect_by=Plane(origin=(-14.868024429, 45, 3.868024429), z_dir=(0, 1, 0)), keep=Keep.TOP, mode=Mode.PRIVATE)
    with BuildSketch(Plane(origin=(16, 45, 5), x_dir=(0, -1, 0), z_dir=(-1, 0, 0))) as fillet1_piece_18b_section:
        with BuildLine():
            CenterArc((FILLET1_R, -FILLET1_R), FILLET1_R, 90, 90)
            Line((0, -FILLET1_R), (-FILLET1_R * 0.02, -FILLET1_R))
            Line((-FILLET1_R * 0.02, -FILLET1_R), (-FILLET1_R * 0.02, FILLET1_R * 0.02))
            Line((-FILLET1_R * 0.02, FILLET1_R * 0.02), (FILLET1_R, FILLET1_R * 0.02))
            Line((FILLET1_R, FILLET1_R * 0.02), (FILLET1_R, 0))
        make_face()
    fillet1_piece_18b = extrude(amount=44.5, mode=Mode.PRIVATE)
    fillet1_piece_18b = split(fillet1_piece_18b, bisect_by=Plane(origin=(-16, 43.868024429, 3.868024429), z_dir=(-1, 0, 0)), keep=Keep.TOP, mode=Mode.PRIVATE)
    fillet1_piece_18 = fillet1_piece_18a & fillet1_piece_18b
    add(fillet1_piece_18, mode=Mode.SUBTRACT)


solid = part.part
